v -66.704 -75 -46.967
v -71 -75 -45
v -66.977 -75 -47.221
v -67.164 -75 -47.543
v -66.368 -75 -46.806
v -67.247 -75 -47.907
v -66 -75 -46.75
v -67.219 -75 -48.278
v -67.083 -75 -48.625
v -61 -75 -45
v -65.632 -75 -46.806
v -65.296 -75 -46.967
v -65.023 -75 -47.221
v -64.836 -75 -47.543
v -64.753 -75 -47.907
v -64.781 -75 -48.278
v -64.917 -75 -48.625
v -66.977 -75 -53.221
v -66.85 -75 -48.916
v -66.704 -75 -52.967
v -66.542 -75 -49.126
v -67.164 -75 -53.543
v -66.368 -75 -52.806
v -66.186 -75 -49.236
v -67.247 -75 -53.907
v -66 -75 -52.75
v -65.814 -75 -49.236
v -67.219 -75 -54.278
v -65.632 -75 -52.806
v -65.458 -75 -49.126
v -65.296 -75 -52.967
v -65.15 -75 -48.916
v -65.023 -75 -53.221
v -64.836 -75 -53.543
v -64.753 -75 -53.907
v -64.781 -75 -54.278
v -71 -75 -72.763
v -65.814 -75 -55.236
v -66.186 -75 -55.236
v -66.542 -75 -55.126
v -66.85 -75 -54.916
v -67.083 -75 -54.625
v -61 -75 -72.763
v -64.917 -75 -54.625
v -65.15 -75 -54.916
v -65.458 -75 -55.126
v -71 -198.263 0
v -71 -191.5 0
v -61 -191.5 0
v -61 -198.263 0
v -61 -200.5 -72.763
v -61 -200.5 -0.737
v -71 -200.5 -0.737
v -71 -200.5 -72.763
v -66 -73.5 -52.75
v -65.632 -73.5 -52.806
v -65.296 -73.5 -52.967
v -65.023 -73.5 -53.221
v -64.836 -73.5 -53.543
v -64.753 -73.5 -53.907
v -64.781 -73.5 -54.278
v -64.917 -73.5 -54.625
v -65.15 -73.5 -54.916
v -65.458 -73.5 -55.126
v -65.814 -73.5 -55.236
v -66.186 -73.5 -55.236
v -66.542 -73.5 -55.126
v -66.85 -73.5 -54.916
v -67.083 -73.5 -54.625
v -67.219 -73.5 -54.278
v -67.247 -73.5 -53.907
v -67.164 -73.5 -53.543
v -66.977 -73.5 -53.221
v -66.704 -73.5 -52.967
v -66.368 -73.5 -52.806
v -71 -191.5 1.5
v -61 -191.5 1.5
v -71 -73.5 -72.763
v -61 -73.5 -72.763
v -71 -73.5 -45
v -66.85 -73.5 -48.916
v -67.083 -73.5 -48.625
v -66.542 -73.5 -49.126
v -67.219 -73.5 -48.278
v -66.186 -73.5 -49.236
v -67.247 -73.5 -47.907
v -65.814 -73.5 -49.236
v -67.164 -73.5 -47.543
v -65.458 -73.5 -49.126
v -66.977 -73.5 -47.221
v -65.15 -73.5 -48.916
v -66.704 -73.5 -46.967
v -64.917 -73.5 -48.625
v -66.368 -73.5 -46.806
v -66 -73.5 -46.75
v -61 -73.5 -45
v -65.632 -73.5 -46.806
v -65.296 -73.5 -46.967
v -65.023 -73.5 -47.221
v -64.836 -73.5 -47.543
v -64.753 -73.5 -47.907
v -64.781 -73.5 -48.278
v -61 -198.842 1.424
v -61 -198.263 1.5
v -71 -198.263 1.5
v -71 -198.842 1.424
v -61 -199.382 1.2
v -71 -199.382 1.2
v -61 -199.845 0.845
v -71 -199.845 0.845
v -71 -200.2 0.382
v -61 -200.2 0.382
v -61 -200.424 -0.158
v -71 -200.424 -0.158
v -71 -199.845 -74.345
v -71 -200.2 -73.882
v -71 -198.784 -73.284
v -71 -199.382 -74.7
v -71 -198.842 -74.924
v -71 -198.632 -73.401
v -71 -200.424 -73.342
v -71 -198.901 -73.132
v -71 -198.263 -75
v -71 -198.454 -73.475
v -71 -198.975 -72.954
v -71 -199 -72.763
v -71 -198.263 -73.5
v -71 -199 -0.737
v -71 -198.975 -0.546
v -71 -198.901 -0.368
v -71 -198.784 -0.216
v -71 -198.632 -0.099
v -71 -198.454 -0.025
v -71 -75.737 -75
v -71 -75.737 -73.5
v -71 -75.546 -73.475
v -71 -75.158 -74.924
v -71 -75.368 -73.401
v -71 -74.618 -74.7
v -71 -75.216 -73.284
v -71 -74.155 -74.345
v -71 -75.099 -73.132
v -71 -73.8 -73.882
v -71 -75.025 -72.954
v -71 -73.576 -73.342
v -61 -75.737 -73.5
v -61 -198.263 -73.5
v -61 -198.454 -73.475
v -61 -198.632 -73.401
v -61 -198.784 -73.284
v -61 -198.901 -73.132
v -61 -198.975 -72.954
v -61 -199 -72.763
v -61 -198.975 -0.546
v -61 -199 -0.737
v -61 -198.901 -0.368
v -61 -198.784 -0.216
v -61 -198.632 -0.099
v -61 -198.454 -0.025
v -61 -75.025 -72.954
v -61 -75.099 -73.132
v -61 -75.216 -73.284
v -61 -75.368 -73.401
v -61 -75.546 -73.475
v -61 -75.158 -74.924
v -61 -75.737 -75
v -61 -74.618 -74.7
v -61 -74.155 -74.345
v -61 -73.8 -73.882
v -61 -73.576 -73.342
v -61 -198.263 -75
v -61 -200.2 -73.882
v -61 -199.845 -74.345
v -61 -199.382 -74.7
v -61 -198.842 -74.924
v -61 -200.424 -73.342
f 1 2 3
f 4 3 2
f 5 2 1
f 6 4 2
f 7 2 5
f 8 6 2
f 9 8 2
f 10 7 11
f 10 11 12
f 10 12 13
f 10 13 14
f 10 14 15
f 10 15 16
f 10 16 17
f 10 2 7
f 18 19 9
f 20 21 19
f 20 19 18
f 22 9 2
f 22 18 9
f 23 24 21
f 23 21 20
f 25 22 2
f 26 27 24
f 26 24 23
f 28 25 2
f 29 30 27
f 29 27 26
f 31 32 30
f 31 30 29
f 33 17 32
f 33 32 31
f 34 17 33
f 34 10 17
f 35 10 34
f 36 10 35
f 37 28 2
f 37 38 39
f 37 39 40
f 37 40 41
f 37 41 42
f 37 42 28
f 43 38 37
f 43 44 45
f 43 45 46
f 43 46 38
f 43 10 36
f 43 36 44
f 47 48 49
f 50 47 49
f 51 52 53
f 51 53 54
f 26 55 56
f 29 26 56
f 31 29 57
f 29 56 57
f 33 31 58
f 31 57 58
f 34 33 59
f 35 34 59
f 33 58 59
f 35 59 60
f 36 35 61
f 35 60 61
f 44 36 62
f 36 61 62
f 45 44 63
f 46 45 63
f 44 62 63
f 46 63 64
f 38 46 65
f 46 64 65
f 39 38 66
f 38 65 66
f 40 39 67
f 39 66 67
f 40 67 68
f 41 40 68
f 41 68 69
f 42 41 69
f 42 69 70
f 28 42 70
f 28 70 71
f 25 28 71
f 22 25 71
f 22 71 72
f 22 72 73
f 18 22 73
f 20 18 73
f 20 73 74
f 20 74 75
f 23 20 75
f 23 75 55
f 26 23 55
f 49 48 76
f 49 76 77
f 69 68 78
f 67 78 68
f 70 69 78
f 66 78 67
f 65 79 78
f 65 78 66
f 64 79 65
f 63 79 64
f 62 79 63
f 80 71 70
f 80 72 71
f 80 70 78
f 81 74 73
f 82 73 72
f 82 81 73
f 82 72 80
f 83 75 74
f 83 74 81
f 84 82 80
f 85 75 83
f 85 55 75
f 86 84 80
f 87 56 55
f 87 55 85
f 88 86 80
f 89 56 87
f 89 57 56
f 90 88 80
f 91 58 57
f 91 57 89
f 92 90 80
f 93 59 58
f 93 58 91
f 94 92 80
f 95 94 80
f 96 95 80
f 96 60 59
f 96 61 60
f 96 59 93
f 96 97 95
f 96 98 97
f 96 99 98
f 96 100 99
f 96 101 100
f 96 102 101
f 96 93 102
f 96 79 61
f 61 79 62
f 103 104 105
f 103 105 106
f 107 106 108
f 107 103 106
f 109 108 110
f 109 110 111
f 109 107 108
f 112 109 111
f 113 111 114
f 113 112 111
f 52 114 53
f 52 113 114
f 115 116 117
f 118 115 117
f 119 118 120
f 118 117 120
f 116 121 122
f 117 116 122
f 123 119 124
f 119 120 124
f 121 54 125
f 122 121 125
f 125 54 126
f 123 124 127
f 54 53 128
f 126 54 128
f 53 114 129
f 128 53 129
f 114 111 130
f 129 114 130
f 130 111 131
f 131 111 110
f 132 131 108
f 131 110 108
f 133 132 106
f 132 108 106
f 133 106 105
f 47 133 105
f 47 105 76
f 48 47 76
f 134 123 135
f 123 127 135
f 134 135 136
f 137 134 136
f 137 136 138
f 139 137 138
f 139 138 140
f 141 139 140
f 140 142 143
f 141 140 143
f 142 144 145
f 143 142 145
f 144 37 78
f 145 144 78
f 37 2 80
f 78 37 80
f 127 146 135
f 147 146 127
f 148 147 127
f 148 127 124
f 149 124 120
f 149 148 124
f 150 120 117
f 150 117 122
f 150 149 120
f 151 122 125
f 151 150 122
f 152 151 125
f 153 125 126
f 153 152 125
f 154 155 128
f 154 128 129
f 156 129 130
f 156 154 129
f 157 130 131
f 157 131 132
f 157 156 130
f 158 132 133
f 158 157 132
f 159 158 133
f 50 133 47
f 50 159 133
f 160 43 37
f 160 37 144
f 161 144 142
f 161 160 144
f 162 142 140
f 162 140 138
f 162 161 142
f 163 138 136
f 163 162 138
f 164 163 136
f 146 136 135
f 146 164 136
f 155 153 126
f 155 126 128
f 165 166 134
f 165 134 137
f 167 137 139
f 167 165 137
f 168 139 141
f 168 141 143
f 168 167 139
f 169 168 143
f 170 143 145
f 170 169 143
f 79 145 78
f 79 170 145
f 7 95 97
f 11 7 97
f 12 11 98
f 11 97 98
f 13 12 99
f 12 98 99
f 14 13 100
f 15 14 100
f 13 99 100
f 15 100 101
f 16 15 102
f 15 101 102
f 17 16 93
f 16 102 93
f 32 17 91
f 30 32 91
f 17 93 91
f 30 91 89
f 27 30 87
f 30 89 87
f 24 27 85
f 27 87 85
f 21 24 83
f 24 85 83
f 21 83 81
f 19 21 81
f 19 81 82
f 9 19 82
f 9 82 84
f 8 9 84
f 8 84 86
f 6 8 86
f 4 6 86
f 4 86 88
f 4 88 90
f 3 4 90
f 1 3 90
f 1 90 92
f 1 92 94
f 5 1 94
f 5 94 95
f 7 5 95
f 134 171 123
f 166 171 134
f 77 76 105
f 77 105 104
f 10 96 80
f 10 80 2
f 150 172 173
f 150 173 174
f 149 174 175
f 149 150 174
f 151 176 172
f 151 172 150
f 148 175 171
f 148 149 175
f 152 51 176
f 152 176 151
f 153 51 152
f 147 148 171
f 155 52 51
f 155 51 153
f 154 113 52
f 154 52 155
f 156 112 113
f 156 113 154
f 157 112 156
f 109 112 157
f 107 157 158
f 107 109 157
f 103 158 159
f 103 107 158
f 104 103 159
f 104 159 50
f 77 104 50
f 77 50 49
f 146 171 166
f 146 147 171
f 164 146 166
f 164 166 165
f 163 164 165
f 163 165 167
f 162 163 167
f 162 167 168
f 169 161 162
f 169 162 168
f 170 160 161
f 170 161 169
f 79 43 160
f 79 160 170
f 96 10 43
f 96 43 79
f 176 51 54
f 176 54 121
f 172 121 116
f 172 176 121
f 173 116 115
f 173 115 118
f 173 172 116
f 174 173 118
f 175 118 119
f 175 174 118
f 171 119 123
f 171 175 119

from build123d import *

# Parameters (mm, degrees)
SKETCH1_W                    = 10
SKETCH1_H                    = 7.500039556
BASE_FLANGE1_DEPTH           = 1.5
EDGE_FLANGE1_STRIP_W         = 7.4732
EDGE_FLANGE1_STRIP_H         = 1.5
EDGE_FLANGE1_STRIP_CUT_DEPTH = 10
EDGE_FLANGE1_DEPTH           = 10
EDGE_FLANGE2_STRIP_W         = 7.4732
EDGE_FLANGE2_STRIP_H         = 1.5
EDGE_FLANGE2_STRIP_CUT_DEPTH = 10
EDGE_FLANGE2_DEPTH           = 10
EDGE_FLANGE3_STRIP_W         = 7.4732
EDGE_FLANGE3_STRIP_H         = 1.5
EDGE_FLANGE3_STRIP_CUT_DEPTH = 10
EDGE_FLANGE3_DEPTH           = 10
CUT_EXTRUDE1_REACH           = 165.692
SKETCH15_R                   = 1.25


# Sheet-metal steps are written as plain solids
with BuildPart() as part:
    # Sketch1 → Base-Flange1 (new body)
    with BuildSketch(Plane.XY):
        with Locations((-66, -195.249980222)):
            Rectangle(SKETCH1_W, SKETCH1_H)
    extrude(amount=BASE_FLANGE1_DEPTH)

    # Edge-Flange1 strip (across the edge) → Edge-Flange1 strip cut (cut)
    with BuildSketch(Plane(origin=(-61, -199, 0), x_dir=(0, 1, 0), z_dir=(-1, 0, 0))):
        with Locations((-3, -0.75)):
            Rectangle(EDGE_FLANGE1_STRIP_W, EDGE_FLANGE1_STRIP_H)
    extrude(amount=EDGE_FLANGE1_STRIP_CUT_DEPTH, mode=Mode.SUBTRACT)

    # Edge-Flange1 section (across the edge) → Edge-Flange1 (add)
    with BuildSketch(Plane(origin=(-61, -199, 0), x_dir=(0, 1, 0), z_dir=(-1, 0, 0))):
        with BuildLine():
            Line((-1.5, 0.7366), (-1.5, 73.5))
            Line((-1.5, 73.5), (0, 73.5))
            Line((0, 73.5), (0, 0.7366))
            ThreePointArc((0, 0.7366), (0.215745145, 0.215745145), (0.7366, 0))
            Line((0.7366, 0), (0.7366, -1.5))
            ThreePointArc((0.7366, -1.5), (-0.844915027, -0.844915027), (-1.5, 0.7366))
        make_face()
    extrude(amount=EDGE_FLANGE1_DEPTH)

    # Edge-Flange2 strip (across the edge) → Edge-Flange2 strip cut (cut)
    with BuildSketch(Plane(origin=(-61, -199, -73.5), x_dir=(0, 0, 1), z_dir=(-1, 0, 0))):
        with Locations((-3, -0.75)):
            Rectangle(EDGE_FLANGE2_STRIP_W, EDGE_FLANGE2_STRIP_H)
    extrude(amount=EDGE_FLANGE2_STRIP_CUT_DEPTH, mode=Mode.SUBTRACT)

    # Edge-Flange2 section (across the edge) → Edge-Flange2 (add)
    with BuildSketch(Plane(origin=(-61, -199, -73.5), x_dir=(0, 0, 1), z_dir=(-1, 0, 0))):
        with BuildLine():
            Line((-1.5, 0.7366), (-1.5, 124))
            Line((-1.5, 124), (0, 124))
            Line((0, 124), (0, 0.7366))
            ThreePointArc((0, 0.7366), (0.215745145, 0.215745145), (0.7366, 0))
            Line((0.7366, 0), (0.7366, -1.5))
            ThreePointArc((0.7366, -1.5), (-0.844915027, -0.844915027), (-1.5, 0.7366))
        make_face()
    extrude(amount=EDGE_FLANGE2_DEPTH)

    # Edge-Flange3 strip (across the edge) → Edge-Flange3 strip cut (cut)
    with BuildSketch(Plane(origin=(-61, -75, -73.5), x_dir=(0, -1, 0), z_dir=(-1, 0, 0))):
        with Locations((-3, -0.75)):
            Rectangle(EDGE_FLANGE3_STRIP_W, EDGE_FLANGE3_STRIP_H)
    extrude(amount=EDGE_FLANGE3_STRIP_CUT_DEPTH, mode=Mode.SUBTRACT)

    # Edge-Flange3 section (across the edge) → Edge-Flange3 (add)
    with BuildSketch(Plane(origin=(-61, -75, -73.5), x_dir=(0, -1, 0), z_dir=(-1, 0, 0))):
        with BuildLine():
            Line((-1.5, 0.7366), (-1.5, 28.5))
            Line((-1.5, 28.5), (0, 28.5))
            Line((0, 28.5), (0, 0.7366))
            ThreePointArc((0, 0.7366), (0.215745145, 0.215745145), (0.7366, 0))
            Line((0.7366, 0), (0.7366, -1.5))
            ThreePointArc((0.7366, -1.5), (-0.844915027, -0.844915027), (-1.5, 0.7366))
        make_face()
    extrude(amount=EDGE_FLANGE3_DEPTH)

    # Sketch15 → Cut-Extrude1 (cut, up to next)
    with BuildSketch(Plane(origin=(0, -73.5, 0), x_dir=(1, 0, 0), z_dir=(0, 1, 0)), mode=Mode.PRIVATE) as cut_extrude1_sk1:
        with Locations(Location((-66, 48, 0), (0, 0, 270))):
            Circle(SKETCH15_R)
    cut_extrude1_tool1 = extrude(cut_extrude1_sk1.sketch, amount=-CUT_EXTRUDE1_REACH, mode=Mode.PRIVATE) & part.part
    # Sketch15 → Cut-Extrude1 (cut, up to next)
    with BuildSketch(Plane(origin=(0, -73.5, 0), x_dir=(1, 0, 0), z_dir=(0, 1, 0)), mode=Mode.PRIVATE) as cut_extrude1_sk2:
        with Locations(Location((-66, 54, 0), (0, 0, 270))):
            Circle(SKETCH15_R)
    cut_extrude1_tool2 = extrude(cut_extrude1_sk2.sketch, amount=-CUT_EXTRUDE1_REACH, mode=Mode.PRIVATE) & part.part
    add(cut_extrude1_tool1.solids().sort_by_distance((-66, -73.5, -48))[0], mode=Mode.SUBTRACT)
    add(cut_extrude1_tool2.solids().sort_by_distance((-66, -73.5, -54))[0], mode=Mode.SUBTRACT)


solid = part.part
